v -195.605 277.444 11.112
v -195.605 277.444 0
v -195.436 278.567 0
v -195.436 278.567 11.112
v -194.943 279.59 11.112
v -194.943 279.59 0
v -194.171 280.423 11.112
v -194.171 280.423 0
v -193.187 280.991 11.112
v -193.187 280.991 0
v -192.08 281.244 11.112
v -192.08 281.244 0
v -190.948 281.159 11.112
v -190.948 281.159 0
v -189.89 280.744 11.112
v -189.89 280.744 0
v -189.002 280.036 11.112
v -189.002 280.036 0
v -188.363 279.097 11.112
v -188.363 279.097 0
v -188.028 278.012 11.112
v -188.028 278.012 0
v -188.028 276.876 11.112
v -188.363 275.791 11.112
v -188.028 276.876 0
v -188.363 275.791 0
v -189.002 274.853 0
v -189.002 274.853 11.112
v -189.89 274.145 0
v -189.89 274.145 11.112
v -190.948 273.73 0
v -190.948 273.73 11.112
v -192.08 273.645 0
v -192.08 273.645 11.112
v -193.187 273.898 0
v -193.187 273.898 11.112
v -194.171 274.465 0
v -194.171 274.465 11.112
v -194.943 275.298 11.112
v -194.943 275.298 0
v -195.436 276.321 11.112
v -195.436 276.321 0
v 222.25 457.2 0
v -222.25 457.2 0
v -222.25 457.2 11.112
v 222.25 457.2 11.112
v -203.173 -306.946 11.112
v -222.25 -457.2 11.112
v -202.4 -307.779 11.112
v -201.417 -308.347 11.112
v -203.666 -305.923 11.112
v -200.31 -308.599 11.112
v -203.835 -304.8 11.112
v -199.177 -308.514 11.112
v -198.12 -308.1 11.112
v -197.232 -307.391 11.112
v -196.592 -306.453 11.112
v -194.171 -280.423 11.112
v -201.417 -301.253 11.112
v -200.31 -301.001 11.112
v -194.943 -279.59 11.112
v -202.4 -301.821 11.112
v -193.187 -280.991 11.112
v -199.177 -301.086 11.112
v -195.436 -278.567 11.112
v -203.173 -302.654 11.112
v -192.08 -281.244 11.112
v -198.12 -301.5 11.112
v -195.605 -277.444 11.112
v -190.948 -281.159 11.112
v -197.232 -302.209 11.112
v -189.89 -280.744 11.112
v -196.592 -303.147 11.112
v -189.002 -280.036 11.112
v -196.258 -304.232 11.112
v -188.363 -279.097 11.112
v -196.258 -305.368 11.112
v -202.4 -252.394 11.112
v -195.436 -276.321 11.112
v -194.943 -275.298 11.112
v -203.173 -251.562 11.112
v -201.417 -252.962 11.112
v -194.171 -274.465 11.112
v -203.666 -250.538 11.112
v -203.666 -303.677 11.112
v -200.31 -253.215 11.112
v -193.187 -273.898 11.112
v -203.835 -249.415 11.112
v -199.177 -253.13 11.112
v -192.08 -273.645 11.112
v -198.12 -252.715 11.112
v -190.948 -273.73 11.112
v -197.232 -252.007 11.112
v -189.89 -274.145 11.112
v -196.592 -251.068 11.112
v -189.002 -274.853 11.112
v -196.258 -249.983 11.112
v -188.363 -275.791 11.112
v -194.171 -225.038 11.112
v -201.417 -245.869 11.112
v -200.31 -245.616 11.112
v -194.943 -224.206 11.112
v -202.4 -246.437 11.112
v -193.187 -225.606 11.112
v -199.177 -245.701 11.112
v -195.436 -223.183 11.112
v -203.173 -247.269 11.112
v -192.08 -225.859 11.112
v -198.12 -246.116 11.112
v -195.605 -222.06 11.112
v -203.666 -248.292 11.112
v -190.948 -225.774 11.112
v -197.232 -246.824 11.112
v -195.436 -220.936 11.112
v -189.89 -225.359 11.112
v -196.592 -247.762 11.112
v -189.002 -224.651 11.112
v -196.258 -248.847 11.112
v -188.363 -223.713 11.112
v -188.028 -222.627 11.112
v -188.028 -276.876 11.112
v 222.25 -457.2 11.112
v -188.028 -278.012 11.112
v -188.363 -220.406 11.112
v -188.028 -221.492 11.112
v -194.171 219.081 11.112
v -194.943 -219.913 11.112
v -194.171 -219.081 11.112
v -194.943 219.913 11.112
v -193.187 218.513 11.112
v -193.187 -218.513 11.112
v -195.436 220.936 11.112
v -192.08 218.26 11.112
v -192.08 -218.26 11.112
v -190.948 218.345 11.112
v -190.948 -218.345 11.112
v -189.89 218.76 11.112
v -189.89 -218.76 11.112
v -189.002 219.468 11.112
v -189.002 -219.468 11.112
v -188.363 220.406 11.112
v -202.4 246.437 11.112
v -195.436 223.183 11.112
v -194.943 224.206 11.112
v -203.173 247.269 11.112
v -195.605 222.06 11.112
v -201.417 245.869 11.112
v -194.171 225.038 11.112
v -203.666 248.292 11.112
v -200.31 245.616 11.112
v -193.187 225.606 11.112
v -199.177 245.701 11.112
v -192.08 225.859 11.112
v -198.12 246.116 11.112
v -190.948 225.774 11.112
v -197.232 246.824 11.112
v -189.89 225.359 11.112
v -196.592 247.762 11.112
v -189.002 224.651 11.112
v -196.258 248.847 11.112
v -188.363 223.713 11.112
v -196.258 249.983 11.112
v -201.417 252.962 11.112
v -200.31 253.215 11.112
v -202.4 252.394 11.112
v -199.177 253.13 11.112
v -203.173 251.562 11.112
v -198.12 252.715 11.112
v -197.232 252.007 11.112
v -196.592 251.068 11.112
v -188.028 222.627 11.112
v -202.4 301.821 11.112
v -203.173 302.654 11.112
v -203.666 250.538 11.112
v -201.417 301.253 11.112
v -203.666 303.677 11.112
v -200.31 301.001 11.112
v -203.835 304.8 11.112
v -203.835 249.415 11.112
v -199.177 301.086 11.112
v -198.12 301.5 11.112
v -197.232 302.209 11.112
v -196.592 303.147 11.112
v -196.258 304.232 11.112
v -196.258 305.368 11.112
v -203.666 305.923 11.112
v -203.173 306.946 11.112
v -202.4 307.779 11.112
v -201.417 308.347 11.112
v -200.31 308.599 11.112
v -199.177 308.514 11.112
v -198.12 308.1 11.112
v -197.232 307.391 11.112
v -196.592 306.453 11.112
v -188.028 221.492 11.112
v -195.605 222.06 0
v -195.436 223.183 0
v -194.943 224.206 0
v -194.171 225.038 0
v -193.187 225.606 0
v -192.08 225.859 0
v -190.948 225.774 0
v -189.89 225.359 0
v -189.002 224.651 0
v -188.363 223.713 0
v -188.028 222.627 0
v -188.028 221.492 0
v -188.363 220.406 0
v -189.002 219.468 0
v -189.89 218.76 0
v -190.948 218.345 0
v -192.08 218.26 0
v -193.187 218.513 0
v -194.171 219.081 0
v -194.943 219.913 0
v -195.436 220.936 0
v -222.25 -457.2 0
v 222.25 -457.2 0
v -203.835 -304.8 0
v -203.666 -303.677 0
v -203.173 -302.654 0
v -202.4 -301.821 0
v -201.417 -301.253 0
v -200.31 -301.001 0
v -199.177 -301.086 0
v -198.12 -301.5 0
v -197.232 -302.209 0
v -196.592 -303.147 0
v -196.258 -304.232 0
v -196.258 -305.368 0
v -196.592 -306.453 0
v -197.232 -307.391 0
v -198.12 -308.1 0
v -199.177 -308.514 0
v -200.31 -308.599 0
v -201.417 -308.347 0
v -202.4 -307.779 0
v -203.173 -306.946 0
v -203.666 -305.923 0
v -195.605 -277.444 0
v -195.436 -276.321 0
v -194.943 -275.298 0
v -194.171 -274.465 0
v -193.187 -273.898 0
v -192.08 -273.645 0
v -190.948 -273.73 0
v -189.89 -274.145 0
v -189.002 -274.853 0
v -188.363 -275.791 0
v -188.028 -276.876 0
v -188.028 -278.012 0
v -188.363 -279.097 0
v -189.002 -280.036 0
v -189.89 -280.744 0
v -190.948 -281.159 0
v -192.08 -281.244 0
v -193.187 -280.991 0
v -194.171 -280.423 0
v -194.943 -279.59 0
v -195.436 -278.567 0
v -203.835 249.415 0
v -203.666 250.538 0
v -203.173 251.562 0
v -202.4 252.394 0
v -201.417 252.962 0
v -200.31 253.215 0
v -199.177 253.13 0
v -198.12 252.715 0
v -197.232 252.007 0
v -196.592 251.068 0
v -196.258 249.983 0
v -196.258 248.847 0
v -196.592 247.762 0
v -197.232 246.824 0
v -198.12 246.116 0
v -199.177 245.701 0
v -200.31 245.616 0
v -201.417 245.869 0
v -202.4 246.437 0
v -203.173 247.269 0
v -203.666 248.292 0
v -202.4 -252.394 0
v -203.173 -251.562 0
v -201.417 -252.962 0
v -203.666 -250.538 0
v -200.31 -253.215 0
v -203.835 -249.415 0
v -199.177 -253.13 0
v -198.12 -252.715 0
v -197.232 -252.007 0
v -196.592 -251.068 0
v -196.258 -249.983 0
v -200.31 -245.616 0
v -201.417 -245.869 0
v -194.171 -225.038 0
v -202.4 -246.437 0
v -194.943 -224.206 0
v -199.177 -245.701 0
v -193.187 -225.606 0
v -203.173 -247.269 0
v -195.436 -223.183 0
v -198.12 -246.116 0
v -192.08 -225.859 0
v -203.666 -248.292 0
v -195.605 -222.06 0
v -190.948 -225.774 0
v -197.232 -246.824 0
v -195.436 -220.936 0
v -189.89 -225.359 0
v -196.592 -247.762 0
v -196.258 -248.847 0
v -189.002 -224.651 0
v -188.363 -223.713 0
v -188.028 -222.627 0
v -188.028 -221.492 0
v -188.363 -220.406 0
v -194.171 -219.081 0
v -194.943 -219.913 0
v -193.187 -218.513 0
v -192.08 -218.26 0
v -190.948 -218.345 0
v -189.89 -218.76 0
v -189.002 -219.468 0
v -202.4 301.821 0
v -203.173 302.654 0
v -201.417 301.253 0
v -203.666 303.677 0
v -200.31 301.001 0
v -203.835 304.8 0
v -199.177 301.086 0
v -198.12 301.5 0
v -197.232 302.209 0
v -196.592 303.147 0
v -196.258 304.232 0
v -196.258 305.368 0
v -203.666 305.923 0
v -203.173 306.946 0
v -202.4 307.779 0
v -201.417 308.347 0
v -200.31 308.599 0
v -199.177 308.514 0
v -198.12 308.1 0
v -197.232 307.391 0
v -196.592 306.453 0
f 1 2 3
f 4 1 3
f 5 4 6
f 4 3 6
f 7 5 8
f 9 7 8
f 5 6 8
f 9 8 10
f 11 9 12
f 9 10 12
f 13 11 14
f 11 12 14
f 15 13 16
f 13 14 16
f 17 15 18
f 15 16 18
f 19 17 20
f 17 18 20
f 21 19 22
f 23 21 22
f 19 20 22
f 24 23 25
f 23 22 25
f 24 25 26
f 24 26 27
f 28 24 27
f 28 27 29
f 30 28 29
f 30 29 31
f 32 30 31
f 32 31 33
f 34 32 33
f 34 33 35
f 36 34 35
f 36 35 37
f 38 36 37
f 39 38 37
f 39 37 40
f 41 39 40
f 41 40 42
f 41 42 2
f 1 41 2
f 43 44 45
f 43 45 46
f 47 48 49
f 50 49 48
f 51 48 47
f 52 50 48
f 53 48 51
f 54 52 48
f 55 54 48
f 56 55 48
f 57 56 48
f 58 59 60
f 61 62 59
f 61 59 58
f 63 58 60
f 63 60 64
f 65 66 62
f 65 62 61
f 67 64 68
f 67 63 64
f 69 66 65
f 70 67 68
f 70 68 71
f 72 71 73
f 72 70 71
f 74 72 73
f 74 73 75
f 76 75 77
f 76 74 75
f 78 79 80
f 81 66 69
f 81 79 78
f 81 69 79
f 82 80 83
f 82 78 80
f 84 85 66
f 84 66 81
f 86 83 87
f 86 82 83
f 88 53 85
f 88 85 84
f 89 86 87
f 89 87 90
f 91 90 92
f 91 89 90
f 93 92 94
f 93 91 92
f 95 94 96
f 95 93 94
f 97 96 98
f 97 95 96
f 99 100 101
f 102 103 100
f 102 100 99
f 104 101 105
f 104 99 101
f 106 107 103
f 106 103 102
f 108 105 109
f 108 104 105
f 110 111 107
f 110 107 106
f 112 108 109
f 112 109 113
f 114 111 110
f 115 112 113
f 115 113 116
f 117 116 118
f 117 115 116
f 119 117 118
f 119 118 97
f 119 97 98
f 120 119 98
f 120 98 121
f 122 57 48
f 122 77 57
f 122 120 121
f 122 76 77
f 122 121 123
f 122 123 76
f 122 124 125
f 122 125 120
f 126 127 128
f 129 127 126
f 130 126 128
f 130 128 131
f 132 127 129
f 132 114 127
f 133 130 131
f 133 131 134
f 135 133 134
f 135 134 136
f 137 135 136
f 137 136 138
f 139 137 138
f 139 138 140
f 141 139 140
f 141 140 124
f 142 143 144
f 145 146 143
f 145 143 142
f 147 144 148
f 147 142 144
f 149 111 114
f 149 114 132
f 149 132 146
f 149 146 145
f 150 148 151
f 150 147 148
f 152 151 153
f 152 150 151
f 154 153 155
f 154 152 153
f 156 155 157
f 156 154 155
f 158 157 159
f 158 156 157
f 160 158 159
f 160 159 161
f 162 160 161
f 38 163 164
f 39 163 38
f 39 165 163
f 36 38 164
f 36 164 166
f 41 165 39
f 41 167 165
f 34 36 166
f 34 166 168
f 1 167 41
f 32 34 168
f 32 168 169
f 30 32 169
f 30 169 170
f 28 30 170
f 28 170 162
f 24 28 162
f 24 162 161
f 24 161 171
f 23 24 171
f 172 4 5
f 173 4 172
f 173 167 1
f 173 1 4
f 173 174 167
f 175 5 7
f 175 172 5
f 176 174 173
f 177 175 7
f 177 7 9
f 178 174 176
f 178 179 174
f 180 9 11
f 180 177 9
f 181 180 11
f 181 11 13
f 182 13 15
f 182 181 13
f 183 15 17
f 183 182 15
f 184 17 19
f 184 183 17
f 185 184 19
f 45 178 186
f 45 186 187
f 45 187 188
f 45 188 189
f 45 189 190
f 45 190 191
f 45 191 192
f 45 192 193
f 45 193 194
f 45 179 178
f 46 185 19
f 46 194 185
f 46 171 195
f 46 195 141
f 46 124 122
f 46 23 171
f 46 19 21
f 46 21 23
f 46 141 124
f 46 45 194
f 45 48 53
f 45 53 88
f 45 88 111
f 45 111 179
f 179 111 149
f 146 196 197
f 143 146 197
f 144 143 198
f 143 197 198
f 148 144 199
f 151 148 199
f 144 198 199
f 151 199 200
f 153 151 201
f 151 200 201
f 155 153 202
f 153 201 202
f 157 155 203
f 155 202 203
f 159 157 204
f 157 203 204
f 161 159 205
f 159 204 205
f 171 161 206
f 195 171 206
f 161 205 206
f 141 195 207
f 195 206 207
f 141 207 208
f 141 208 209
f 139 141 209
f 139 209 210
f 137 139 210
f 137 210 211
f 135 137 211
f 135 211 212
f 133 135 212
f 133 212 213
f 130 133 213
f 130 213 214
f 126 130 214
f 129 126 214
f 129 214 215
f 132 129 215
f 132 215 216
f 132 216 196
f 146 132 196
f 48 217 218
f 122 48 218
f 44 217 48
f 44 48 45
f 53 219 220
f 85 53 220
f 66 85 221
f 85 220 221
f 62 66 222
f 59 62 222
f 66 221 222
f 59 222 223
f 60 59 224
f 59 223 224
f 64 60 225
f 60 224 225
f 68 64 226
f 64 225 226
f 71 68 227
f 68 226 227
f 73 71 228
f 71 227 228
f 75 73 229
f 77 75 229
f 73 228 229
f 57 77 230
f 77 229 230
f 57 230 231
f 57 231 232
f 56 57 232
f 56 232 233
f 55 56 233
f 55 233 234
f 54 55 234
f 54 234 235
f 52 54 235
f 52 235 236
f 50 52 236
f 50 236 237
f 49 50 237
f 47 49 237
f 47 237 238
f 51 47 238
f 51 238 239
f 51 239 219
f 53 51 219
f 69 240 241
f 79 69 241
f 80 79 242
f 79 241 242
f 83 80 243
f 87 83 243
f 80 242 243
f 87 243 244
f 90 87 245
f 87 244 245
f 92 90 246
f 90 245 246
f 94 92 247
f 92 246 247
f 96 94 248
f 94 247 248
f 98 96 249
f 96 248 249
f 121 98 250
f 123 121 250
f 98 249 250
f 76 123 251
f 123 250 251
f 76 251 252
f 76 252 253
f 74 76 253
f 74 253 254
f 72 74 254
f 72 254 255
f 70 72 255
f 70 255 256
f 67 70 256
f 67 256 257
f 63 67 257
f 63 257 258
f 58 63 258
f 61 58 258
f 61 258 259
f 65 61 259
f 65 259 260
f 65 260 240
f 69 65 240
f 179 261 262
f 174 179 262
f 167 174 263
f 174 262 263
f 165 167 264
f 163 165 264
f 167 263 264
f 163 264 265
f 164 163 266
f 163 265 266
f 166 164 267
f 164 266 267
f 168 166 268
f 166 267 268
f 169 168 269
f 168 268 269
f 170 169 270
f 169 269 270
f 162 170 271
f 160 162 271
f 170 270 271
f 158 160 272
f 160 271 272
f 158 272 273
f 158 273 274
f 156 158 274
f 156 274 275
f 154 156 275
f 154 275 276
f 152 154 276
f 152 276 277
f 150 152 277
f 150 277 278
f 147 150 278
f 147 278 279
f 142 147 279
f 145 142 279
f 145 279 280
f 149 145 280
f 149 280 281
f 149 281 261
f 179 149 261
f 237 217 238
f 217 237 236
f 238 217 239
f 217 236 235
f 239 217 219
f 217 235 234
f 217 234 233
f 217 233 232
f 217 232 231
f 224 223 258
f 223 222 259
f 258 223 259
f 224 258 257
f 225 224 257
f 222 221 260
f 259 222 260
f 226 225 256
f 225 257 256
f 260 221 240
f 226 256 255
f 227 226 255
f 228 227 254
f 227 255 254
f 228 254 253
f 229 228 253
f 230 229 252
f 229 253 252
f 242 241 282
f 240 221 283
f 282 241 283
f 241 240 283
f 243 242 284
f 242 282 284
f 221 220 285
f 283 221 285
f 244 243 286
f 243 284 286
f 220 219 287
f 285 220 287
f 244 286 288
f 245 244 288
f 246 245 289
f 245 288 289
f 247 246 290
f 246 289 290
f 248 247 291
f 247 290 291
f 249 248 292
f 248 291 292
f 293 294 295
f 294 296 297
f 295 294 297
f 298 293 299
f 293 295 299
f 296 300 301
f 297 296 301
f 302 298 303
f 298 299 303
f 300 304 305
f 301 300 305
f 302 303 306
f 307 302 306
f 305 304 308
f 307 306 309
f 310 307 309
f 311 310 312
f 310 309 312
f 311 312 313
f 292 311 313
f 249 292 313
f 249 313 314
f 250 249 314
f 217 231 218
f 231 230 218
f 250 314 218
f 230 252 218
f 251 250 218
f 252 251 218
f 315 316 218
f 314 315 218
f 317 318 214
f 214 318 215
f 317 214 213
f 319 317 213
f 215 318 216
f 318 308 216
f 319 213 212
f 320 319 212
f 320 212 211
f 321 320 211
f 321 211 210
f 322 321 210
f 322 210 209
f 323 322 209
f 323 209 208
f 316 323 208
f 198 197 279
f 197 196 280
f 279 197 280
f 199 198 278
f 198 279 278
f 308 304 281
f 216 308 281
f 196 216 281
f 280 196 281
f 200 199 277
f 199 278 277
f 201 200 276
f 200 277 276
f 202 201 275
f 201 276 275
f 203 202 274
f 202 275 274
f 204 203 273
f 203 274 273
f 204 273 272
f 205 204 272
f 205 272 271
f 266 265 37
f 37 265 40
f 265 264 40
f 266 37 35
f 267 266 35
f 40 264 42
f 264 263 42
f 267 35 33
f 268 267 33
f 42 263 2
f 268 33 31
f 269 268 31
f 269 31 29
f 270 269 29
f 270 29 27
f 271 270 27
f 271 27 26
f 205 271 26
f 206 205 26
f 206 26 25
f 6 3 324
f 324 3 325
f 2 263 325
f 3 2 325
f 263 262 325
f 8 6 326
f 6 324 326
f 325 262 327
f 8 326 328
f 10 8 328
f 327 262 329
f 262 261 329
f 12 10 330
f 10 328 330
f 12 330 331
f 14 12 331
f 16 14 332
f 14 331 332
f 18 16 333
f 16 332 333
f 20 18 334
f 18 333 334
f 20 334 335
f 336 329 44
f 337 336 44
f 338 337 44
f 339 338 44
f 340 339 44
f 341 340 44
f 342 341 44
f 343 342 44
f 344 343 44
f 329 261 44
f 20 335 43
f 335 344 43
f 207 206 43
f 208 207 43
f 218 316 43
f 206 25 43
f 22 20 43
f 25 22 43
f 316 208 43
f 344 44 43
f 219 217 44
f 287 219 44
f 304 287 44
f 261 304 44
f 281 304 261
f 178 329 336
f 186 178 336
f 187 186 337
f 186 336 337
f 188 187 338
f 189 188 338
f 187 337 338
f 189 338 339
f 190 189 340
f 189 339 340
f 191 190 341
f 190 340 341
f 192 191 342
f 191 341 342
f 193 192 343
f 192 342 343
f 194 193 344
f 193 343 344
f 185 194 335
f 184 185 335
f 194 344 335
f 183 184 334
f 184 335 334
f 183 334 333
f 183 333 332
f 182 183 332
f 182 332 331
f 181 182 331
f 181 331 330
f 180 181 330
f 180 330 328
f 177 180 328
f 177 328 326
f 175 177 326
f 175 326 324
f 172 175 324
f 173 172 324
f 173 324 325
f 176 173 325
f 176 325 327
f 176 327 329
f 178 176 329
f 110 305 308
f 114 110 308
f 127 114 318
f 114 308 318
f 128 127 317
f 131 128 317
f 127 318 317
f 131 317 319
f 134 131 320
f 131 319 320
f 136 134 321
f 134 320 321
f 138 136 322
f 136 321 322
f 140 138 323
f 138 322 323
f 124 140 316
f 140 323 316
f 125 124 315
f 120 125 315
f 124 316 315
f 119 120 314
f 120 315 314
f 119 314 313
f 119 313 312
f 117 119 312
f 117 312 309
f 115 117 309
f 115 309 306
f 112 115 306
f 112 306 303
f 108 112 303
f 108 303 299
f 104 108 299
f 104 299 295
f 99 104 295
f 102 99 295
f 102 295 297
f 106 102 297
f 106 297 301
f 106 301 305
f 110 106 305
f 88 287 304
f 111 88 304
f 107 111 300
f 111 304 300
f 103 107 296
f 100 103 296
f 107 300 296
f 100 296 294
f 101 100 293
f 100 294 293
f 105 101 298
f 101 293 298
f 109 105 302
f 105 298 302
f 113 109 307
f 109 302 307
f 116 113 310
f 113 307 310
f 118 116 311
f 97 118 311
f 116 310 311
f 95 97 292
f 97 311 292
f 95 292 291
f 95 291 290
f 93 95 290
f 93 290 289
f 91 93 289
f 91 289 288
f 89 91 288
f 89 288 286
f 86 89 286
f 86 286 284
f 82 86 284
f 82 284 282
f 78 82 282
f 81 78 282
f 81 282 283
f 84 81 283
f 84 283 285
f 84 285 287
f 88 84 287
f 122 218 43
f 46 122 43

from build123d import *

# Parameters (mm, degrees)
F0_W     = 444.5
F0_H     = 914.4
F1_DEPTH = 11.1125
F3_D     = 7.62
F3_DEPTH = 12.7


with BuildPart() as f1:
    # F0 (on Top) → F1 (new body)
    with BuildSketch(Plane.XY):
        Rectangle(F0_W, F0_H)
    extrude(amount=F1_DEPTH)

    # F3
    with Locations(Plane.XY.offset(11.1125)):
        with Locations((-191.7954, 277.4442), (-200.025, 304.8), (-200.025, 249.4153), (-191.7954, 222.0595), (-191.7954, -222.0595), (-200.025, -249.4153), (-191.7954, -277.4442), (-200.025, -304.8)):
            Hole(F3_D / 2, depth=F3_DEPTH)


solid = f1.part
